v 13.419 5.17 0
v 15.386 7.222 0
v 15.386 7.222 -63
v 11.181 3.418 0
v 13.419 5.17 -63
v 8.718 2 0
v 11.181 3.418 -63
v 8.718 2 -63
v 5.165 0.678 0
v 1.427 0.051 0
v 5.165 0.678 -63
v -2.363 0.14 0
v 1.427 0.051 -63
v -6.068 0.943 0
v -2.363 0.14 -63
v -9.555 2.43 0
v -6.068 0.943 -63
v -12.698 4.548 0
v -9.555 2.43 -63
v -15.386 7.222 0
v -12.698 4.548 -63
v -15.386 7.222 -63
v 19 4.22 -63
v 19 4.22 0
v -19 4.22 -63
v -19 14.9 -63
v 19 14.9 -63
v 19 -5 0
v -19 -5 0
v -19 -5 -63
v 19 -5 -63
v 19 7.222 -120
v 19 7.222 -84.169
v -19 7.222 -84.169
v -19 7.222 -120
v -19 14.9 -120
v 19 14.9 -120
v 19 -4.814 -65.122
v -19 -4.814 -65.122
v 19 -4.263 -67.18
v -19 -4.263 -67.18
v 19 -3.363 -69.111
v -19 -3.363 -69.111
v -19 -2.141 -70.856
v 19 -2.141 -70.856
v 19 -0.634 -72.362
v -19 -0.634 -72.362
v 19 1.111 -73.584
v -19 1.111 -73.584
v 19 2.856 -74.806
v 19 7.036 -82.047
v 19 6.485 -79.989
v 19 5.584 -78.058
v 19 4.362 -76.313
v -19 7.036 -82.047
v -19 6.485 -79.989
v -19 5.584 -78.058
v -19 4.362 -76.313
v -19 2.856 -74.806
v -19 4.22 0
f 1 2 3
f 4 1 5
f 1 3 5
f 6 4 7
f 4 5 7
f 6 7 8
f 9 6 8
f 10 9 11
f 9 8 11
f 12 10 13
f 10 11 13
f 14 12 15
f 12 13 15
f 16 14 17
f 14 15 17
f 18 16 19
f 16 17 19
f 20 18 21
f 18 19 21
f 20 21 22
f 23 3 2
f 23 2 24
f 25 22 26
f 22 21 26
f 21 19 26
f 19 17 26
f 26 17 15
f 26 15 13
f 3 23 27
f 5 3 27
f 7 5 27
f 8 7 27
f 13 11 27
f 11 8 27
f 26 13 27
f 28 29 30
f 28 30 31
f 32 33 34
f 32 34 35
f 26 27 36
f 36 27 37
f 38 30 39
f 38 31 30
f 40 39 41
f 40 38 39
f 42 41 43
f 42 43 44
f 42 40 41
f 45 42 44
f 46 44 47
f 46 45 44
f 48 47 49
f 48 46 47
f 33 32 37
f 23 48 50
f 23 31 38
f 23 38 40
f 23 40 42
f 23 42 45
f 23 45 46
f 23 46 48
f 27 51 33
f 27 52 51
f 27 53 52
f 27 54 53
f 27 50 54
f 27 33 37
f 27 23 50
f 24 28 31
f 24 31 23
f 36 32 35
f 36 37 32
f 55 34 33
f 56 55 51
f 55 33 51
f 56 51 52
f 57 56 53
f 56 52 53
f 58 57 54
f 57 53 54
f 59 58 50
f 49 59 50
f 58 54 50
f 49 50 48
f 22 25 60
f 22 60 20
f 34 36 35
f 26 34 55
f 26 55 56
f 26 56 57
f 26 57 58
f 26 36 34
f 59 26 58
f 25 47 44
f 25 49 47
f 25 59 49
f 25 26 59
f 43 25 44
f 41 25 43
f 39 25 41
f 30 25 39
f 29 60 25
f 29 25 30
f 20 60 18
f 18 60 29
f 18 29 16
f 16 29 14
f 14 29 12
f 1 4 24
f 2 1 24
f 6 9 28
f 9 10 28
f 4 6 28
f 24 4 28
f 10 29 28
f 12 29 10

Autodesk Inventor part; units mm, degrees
ref_plane "YZ Plane" through (0, 0, 0) normal (1, 0, 0) x (0, 1, 0)
ref_plane "XZ Plane" through (0, 0, 0) normal (0, 1, 0) x (-1, 0, 0)
ref_plane "XY Plane" through (0, 0, 0) normal (0, 0, 1) x (1, 0, 0)
sketch "スケッチ1" plane through (0, 0, 0) normal (0, 1, 0) x (-1, 0, 0)
  line L0 (11.25, 0) -> (-11.25, 0)
  line L1 (-11.25, 0) -> (-11.25, -120)
  line L2 (-11.25, -120) -> (11.25, -120)
  line L3 (11.25, -120) -> (11.25, 0)
  point P0 (0, 0)
  point P1 (0, 0)
  dimension "d0" = 22.5
  dimension "d3" = 120
extrude "押し出し1" add sketch "スケッチ1" along normal blind 2
sketch "スケッチ2" plane through (0, 0, 0) normal (0, -1, 0) x (1, 0, 0)
  line L0 (19, -120) -> (-19, -120)
  line L1 (-19, -120) -> (-19, -103.05)
  line L2 (-19, -103.05) -> (19, -103.05)
  line L3 (19, -103.05) -> (19, -120)
  line L4 (11.25, -120) -> (-11.25, -120) projected
  point P0 (0, 0)
  point P1 (0, -120)
  dimension "d6" = 38
  dimension "d11" = 16.95
extrude "押し出し2" add sketch "スケッチ2" against normal blind 13.44
sketch "スケッチ4" plane through (11.25, 0, -103.05) normal (0, 0, 1) x (1, 0, 0)
  circle A0 centre (-11.25, 20) radius 20
  line L0 (7.75, 0) -> (0, 0) projected
  line L1 (-22.5, 0) -> (0, 0) projected
  point P0 (-11.25, 0)
  point P1 (-11.25, 0)
  dimension "d12" = 40
extrude "押し出し4" cut sketch "スケッチ4" along normal through all
sketch "スケッチ5" plane through (11.25, 0, -103.05) normal (0, 0, 1) x (1, 0, 0)
  circle A0 centre (-11.25, 20) radius 20
  arc A1 (-11.25, 0) -> (-2.5322, 2) centre (-11.25, 20) ccw projected
  line L0 (-30.25, 13.44) -> (7.75, 13.44)
  line L1 (7.75, 13.44) -> (7.75, -5)
  line L2 (7.75, -5) -> (-30.25, -5)
  line L3 (-30.25, -5) -> (-30.25, 13.44)
  line L4 (7.75, 0) -> (7.75, 13.44) projected
  line L5 (7.75, 0) -> (0, 0) projected
  line L6 (-30.25, 4.22) -> (-11.25, 20)
  line L7 (-11.25, 20) -> (7.75, 4.22)
  point P0 (3.875, 0)
  point P1 (7.6436, 13.44)
  point P2 (-30.1436, 13.44)
  point P3 (7.75, 4.22)
  point P4 (4.1356, 7.2218)
  point P5 (-26.6356, 7.2218)
  point P6 (-3.3514, 13.44)
  point P7 (-19.1486, 13.44)
  dimension "d15" = 5
extrude "押し出し5" add sketch "スケッチ5" along normal up to surface (103.05 mm away) contours A0 L7 L1 L2 L3 L6
sketch "スケッチ24" plane through (11.25, 0, -103.05) normal (0, 0, -1) x (-1, 0, 0)
  line L0 (-7.75, 0) -> (11.25, 0) projected
  line L1 (-7.75, -5) -> (-7.75, 0) projected
  line L2 (30.25, -5) -> (-7.75, -5) projected
  line L3 (30.25, 0) -> (30.25, -5) projected
  line L4 (11.25, 0) -> (30.25, 0) projected
  point P0 (11.25, 0)
extrude "押し出し22" add sketch "スケッチ24" along normal up to surface (16.95 mm away)
sketch "スケッチ25" plane through (19, 13.44, -103.05) normal (1, 0, 0) x (0, 0, -1)
  line L0 (-103.05, -13.44) -> (-103.05, -6.2182) projected
  line L1 (16.95, -18.44) -> (16.95, 0) projected
  line L2 (16.95, -13.44) -> (-40.05, -13.44)
  line L3 (-40.05, -13.44) -> (-40.05, 1.46)
  line L4 (-40.05, 1.46) -> (16.95, 1.46)
  line L5 (16.95, 1.46) -> (16.95, -13.44)
  dimension "d77" = 14.9
  dimension "d78" = 57
extrude "押し出し23" add sketch "スケッチ25" against normal up to surface (38 mm away)
sketch "スケッチ26" plane through (19, -5, 0) normal (1, 0, 0) x (0, 0, -1)
  line L0 (63, 12.2218) -> (0, 12.2218) projected
  circle A0 centre (63, 12.2218) radius 12.2218
  line L1 (0, 0) -> (120, 0) projected
  circle A1 centre (84.1688, 0) radius 12.2218
  line L2 (84.1688, 12.2218) -> (120, 12.2218)
  line L3 (120, 0) -> (120, 19.9) projected
  point P0 (0, 5)
  point P1 (73.5844, 6.1109)
  point P2 (63, 0)
extrude "押し出し24" cut sketch "スケッチ26" against normal through all contours A1 L1 A0 | A1 L1 | L2 L3 L1 A1 picked at (80.2991, 4.512)
properties part number "arm_1_remake"
